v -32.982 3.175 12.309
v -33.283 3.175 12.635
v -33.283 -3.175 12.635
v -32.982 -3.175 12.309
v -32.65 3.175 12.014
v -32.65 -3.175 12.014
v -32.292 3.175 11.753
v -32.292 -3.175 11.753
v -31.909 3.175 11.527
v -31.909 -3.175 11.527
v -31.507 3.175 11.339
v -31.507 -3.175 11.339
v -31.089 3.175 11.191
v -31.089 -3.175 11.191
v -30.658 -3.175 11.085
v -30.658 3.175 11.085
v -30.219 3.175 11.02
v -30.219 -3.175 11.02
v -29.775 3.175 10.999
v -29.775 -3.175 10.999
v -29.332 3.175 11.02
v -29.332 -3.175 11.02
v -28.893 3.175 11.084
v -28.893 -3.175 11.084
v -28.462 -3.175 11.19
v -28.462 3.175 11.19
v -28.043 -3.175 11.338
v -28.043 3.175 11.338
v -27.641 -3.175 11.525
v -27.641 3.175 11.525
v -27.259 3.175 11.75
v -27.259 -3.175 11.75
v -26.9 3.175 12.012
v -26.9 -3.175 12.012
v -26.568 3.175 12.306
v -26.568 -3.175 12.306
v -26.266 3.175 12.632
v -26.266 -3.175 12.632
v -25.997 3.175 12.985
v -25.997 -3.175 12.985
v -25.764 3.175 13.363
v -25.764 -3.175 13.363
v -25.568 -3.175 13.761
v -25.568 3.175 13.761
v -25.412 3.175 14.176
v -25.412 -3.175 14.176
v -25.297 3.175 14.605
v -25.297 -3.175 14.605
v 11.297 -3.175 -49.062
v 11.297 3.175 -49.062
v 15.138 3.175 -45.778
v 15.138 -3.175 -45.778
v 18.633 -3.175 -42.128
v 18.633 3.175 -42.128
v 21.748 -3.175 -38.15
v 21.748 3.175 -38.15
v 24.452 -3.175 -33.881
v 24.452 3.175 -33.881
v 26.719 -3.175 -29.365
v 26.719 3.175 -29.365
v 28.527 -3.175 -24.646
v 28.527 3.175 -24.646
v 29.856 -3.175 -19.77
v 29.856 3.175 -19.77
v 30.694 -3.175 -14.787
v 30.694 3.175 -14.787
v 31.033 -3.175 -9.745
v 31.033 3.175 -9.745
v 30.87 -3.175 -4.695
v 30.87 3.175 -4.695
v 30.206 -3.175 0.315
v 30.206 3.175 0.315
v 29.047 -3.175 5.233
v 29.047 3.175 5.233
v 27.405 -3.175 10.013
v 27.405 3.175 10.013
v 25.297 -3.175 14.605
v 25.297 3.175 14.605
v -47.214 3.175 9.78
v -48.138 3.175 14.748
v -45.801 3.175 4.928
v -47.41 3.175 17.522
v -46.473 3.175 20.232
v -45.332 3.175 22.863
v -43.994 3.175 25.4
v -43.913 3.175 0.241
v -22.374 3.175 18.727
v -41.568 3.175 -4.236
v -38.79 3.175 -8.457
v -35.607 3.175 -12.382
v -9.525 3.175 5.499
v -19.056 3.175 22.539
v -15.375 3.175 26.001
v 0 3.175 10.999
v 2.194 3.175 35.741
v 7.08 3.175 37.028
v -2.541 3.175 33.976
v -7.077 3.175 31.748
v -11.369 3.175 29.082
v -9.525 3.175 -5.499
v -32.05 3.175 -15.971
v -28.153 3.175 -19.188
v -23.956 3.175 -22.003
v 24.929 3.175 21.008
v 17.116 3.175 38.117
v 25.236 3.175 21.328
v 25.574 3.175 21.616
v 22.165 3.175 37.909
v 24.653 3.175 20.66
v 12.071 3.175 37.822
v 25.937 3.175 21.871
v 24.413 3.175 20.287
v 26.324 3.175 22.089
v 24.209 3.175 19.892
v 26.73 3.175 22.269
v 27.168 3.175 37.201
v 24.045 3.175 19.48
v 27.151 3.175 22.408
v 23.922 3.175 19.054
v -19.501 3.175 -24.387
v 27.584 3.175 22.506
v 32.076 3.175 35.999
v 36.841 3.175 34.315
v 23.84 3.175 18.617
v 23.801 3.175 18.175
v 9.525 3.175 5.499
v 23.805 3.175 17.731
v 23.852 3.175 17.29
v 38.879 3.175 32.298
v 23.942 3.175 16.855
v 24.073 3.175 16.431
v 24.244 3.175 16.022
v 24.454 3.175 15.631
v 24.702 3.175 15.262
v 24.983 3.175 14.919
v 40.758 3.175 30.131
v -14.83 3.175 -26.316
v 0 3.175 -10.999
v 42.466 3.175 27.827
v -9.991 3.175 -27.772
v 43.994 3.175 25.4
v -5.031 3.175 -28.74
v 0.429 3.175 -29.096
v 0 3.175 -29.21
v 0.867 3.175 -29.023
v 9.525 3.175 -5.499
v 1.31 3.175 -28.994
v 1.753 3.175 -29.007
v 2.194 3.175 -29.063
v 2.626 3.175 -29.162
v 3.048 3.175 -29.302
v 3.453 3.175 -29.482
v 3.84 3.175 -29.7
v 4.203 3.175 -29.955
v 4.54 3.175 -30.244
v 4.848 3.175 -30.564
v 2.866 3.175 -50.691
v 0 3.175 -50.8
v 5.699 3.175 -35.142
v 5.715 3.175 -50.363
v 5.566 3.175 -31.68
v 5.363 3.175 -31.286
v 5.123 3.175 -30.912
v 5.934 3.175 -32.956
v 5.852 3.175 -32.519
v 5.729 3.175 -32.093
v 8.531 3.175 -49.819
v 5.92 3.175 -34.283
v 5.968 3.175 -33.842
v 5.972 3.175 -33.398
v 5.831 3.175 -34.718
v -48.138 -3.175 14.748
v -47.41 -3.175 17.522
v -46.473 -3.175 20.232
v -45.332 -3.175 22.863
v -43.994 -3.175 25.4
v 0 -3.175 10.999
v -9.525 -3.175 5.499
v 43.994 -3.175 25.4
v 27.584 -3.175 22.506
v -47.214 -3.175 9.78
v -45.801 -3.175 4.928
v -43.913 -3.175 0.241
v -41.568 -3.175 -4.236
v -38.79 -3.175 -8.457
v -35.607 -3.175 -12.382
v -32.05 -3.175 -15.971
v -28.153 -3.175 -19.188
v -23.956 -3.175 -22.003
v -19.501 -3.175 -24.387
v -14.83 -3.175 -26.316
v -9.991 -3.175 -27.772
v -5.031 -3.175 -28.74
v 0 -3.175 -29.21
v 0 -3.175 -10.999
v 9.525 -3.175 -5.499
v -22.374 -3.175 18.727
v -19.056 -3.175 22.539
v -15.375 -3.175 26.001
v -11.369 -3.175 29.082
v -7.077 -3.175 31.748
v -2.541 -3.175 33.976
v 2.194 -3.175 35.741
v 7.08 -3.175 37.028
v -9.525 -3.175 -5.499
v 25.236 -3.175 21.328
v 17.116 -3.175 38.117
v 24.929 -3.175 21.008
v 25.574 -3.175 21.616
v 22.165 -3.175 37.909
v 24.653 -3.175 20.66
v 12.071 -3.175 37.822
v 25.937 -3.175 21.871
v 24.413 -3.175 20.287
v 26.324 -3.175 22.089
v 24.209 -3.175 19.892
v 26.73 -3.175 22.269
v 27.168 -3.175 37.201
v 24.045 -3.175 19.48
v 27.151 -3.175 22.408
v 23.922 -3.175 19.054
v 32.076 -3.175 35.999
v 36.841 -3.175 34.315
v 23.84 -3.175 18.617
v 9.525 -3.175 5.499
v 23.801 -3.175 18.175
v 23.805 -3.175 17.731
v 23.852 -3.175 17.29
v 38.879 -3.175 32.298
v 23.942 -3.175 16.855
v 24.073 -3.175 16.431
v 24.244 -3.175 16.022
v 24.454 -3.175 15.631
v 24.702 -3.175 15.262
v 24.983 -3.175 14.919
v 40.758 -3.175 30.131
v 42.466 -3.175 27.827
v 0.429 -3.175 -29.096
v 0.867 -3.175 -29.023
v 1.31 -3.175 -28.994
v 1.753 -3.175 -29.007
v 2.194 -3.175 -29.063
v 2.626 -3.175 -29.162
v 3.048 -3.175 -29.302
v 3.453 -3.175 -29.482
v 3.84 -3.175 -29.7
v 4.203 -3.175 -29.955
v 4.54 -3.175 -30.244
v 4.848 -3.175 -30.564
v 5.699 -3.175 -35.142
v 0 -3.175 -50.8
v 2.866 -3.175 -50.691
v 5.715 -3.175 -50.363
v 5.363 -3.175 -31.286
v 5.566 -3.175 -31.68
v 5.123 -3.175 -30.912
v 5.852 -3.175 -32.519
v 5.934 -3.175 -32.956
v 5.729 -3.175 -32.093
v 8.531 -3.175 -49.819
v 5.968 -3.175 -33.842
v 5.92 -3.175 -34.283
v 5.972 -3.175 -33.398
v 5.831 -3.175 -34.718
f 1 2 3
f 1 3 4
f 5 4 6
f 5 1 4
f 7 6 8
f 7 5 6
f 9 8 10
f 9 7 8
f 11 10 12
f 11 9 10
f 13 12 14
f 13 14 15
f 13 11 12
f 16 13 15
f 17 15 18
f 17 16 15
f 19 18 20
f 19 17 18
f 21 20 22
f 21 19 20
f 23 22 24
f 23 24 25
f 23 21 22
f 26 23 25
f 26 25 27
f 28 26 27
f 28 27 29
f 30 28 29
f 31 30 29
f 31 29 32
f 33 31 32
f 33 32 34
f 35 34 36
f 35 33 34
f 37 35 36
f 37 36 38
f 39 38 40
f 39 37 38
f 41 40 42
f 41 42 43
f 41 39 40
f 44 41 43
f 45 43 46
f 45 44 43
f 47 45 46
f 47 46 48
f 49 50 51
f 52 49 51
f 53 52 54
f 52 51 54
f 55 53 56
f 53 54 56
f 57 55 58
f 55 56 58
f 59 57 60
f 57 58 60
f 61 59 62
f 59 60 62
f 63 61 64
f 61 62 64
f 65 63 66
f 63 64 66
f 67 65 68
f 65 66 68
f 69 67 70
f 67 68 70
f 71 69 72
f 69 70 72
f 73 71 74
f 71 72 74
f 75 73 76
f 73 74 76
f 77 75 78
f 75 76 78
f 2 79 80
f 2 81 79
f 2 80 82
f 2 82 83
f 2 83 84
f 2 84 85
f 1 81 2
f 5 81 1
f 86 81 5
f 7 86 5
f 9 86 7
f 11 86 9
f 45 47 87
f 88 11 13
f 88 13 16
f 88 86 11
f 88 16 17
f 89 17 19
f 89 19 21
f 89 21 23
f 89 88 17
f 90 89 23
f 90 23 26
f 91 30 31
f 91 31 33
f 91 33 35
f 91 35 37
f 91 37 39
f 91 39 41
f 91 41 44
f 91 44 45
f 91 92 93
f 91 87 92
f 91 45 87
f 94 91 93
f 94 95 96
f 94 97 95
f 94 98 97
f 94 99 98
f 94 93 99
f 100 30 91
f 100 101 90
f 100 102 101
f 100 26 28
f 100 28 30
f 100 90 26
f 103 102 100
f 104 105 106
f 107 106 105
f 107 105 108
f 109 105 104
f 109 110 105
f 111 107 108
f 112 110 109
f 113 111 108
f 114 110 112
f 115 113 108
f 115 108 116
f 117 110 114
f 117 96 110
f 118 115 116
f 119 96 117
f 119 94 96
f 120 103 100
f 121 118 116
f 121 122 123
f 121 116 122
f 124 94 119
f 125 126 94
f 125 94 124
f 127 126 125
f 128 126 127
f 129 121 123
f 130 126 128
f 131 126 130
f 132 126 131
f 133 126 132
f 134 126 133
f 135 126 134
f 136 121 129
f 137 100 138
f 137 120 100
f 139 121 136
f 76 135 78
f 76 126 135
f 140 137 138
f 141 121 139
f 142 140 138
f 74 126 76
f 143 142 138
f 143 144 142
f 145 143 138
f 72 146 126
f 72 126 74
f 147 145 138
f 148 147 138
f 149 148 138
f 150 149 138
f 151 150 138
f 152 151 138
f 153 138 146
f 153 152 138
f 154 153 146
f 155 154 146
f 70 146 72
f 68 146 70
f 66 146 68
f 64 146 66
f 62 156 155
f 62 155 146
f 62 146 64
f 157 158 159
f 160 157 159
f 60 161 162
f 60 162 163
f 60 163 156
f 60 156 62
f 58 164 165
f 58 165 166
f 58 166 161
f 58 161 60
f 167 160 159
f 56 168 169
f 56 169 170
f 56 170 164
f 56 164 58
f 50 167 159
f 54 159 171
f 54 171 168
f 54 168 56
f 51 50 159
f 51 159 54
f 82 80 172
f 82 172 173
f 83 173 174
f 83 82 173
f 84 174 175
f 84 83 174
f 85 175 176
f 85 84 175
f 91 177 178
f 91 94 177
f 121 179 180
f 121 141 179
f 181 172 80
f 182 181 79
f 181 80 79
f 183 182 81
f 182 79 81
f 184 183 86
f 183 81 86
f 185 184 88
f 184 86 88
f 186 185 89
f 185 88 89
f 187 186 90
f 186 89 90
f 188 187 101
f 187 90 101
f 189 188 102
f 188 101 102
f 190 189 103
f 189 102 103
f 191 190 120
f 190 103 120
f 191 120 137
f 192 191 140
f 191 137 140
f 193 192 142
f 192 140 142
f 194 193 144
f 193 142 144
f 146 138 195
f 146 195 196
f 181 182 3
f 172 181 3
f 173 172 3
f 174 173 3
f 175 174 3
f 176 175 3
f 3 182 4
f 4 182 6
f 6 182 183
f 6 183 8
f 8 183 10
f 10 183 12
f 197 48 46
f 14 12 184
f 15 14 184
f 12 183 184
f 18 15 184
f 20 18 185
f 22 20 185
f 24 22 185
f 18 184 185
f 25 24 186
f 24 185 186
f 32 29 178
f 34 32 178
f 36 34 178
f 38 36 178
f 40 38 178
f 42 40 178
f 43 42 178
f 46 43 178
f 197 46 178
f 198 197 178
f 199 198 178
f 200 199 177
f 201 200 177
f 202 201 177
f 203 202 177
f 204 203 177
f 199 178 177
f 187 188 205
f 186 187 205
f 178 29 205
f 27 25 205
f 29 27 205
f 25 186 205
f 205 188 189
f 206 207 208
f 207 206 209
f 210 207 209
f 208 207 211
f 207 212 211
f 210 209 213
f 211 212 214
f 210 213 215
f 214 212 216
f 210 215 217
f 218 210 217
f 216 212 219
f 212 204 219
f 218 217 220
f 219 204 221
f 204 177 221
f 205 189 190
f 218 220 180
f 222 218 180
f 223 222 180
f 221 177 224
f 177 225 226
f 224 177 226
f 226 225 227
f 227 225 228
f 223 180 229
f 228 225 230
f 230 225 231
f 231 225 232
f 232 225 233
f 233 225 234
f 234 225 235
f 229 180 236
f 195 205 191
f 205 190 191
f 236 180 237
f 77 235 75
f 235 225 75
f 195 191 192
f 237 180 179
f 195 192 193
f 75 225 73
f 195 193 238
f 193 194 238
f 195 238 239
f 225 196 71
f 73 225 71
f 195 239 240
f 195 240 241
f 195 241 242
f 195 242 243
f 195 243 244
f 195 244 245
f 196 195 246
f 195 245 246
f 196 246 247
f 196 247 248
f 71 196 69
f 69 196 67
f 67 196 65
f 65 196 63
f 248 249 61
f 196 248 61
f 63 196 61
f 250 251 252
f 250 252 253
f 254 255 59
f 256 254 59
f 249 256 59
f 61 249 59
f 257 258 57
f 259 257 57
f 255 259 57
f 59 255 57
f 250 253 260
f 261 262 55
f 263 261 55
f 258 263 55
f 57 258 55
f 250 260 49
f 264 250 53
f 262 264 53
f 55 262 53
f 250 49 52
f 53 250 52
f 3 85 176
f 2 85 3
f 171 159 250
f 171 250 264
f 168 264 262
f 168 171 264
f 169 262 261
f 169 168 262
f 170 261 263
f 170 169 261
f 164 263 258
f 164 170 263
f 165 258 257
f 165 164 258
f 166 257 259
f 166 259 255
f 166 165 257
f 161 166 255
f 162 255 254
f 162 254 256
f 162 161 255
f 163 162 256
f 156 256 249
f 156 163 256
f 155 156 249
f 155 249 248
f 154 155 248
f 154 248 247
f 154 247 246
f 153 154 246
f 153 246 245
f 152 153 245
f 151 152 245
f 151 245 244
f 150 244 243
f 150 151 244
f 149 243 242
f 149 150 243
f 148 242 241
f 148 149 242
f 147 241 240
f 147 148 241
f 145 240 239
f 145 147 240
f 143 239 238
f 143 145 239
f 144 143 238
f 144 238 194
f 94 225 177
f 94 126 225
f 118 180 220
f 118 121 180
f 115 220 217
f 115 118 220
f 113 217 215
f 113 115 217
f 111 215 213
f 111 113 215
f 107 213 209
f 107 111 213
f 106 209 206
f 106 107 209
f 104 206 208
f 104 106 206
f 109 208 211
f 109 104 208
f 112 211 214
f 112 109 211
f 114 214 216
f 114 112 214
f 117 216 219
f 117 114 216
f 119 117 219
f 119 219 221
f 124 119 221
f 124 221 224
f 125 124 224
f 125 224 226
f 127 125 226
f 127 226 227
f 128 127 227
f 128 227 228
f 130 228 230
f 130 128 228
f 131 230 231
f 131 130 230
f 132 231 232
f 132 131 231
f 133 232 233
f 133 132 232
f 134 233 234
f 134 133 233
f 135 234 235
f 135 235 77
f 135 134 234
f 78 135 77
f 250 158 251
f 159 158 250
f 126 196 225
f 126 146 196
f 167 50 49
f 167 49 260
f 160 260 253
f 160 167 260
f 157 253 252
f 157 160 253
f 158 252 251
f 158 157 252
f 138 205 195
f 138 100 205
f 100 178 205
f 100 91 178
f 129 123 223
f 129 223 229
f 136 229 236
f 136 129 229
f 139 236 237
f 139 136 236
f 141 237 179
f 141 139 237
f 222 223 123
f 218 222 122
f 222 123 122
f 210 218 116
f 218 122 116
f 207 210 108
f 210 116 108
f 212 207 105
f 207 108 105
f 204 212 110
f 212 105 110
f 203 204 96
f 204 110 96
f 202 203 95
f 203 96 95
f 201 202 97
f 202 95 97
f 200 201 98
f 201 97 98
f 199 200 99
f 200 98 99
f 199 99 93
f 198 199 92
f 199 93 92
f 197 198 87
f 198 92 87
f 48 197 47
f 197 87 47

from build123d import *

# Parameters (mm, degrees)
BOSS_EXTRUDE2_DEPTH = 3.175
CUT_EXTRUDE1_DEPTH  = 7.35


with BuildPart() as part:
    # Sketch2 → Boss-Extrude2 (new body, symmetric)
    with BuildSketch(Plane(origin=(0, 0, 0), x_dir=(1, 0, 0), z_dir=(0, 1, 0))):
        with BuildLine():
            Line((0, 50.8), (5.699182497, 35.141624781))
            ThreePointArc((5.699182497, 35.141624781), (4.697625818, 30.400196659), (0, 29.21))
            ThreePointArc((0, 29.21), (-40.712457699, 16.982230342), (-43.994090512, -25.4))
            Line((-43.994090512, -25.4), (-33.283131039, -12.635175567))
            ThreePointArc((-33.283131039, -12.635175567), (-28.676155496, -11.131835033), (-25.296602045, -14.605))
            ThreePointArc((-25.296602045, -14.605), (5.64918596, -43.749137789), (43.994090512, -25.4))
            Line((43.994090512, -25.4), (27.583948542, -22.506449213))
            ThreePointArc((27.583948542, -22.506449213), (23.978529677, -19.268361626), (25.296602045, -14.605))
            ThreePointArc((25.296602045, -14.605), (35.063271738, 26.766907447), (0, 50.8))
        make_face()
        Polygon((0, 10.998522628), (9.525, 5.499261314), (9.525, -5.499261314), (0, -10.998522628), (-9.525, -5.499261314), (-9.525, 5.499261314), align=None, mode=Mode.SUBTRACT)
    extrude(amount=BOSS_EXTRUDE2_DEPTH, both=True)

    # Sketch3 → Cut-Extrude1 (cut, through all)
    with BuildSketch(Plane(origin=(0, 3.175, 0), x_dir=(1, 0, 0), z_dir=(0, 1, 0))):
        with BuildLine():
            ThreePointArc((0, 29.21), (-36.786884898, 21.158593478), (-48.137903328, -14.747595795))
            ThreePointArc((-48.137903328, -14.747595795), (-32.049598102, 15.970797155), (0, 29.21))
        make_face()
        with BuildLine():
            ThreePointArc((11.297159061, 49.062445064), (29.855915106, 19.77036756), (25.296602045, -14.605))
            ThreePointArc((25.296602045, -14.605), (36.717321909, 21.279080109), (11.297159061, 49.062445064))
        make_face()
        with BuildLine():
            ThreePointArc((-25.296602045, -14.605), (0.069562989, -42.437673587), (36.840744267, -34.314849269))
            ThreePointArc((36.840744267, -34.314849269), (2.193682996, -35.741164715), (-25.296602045, -14.605))
        make_face()
    extrude(amount=-CUT_EXTRUDE1_DEPTH, mode=Mode.SUBTRACT)


solid = part.part
